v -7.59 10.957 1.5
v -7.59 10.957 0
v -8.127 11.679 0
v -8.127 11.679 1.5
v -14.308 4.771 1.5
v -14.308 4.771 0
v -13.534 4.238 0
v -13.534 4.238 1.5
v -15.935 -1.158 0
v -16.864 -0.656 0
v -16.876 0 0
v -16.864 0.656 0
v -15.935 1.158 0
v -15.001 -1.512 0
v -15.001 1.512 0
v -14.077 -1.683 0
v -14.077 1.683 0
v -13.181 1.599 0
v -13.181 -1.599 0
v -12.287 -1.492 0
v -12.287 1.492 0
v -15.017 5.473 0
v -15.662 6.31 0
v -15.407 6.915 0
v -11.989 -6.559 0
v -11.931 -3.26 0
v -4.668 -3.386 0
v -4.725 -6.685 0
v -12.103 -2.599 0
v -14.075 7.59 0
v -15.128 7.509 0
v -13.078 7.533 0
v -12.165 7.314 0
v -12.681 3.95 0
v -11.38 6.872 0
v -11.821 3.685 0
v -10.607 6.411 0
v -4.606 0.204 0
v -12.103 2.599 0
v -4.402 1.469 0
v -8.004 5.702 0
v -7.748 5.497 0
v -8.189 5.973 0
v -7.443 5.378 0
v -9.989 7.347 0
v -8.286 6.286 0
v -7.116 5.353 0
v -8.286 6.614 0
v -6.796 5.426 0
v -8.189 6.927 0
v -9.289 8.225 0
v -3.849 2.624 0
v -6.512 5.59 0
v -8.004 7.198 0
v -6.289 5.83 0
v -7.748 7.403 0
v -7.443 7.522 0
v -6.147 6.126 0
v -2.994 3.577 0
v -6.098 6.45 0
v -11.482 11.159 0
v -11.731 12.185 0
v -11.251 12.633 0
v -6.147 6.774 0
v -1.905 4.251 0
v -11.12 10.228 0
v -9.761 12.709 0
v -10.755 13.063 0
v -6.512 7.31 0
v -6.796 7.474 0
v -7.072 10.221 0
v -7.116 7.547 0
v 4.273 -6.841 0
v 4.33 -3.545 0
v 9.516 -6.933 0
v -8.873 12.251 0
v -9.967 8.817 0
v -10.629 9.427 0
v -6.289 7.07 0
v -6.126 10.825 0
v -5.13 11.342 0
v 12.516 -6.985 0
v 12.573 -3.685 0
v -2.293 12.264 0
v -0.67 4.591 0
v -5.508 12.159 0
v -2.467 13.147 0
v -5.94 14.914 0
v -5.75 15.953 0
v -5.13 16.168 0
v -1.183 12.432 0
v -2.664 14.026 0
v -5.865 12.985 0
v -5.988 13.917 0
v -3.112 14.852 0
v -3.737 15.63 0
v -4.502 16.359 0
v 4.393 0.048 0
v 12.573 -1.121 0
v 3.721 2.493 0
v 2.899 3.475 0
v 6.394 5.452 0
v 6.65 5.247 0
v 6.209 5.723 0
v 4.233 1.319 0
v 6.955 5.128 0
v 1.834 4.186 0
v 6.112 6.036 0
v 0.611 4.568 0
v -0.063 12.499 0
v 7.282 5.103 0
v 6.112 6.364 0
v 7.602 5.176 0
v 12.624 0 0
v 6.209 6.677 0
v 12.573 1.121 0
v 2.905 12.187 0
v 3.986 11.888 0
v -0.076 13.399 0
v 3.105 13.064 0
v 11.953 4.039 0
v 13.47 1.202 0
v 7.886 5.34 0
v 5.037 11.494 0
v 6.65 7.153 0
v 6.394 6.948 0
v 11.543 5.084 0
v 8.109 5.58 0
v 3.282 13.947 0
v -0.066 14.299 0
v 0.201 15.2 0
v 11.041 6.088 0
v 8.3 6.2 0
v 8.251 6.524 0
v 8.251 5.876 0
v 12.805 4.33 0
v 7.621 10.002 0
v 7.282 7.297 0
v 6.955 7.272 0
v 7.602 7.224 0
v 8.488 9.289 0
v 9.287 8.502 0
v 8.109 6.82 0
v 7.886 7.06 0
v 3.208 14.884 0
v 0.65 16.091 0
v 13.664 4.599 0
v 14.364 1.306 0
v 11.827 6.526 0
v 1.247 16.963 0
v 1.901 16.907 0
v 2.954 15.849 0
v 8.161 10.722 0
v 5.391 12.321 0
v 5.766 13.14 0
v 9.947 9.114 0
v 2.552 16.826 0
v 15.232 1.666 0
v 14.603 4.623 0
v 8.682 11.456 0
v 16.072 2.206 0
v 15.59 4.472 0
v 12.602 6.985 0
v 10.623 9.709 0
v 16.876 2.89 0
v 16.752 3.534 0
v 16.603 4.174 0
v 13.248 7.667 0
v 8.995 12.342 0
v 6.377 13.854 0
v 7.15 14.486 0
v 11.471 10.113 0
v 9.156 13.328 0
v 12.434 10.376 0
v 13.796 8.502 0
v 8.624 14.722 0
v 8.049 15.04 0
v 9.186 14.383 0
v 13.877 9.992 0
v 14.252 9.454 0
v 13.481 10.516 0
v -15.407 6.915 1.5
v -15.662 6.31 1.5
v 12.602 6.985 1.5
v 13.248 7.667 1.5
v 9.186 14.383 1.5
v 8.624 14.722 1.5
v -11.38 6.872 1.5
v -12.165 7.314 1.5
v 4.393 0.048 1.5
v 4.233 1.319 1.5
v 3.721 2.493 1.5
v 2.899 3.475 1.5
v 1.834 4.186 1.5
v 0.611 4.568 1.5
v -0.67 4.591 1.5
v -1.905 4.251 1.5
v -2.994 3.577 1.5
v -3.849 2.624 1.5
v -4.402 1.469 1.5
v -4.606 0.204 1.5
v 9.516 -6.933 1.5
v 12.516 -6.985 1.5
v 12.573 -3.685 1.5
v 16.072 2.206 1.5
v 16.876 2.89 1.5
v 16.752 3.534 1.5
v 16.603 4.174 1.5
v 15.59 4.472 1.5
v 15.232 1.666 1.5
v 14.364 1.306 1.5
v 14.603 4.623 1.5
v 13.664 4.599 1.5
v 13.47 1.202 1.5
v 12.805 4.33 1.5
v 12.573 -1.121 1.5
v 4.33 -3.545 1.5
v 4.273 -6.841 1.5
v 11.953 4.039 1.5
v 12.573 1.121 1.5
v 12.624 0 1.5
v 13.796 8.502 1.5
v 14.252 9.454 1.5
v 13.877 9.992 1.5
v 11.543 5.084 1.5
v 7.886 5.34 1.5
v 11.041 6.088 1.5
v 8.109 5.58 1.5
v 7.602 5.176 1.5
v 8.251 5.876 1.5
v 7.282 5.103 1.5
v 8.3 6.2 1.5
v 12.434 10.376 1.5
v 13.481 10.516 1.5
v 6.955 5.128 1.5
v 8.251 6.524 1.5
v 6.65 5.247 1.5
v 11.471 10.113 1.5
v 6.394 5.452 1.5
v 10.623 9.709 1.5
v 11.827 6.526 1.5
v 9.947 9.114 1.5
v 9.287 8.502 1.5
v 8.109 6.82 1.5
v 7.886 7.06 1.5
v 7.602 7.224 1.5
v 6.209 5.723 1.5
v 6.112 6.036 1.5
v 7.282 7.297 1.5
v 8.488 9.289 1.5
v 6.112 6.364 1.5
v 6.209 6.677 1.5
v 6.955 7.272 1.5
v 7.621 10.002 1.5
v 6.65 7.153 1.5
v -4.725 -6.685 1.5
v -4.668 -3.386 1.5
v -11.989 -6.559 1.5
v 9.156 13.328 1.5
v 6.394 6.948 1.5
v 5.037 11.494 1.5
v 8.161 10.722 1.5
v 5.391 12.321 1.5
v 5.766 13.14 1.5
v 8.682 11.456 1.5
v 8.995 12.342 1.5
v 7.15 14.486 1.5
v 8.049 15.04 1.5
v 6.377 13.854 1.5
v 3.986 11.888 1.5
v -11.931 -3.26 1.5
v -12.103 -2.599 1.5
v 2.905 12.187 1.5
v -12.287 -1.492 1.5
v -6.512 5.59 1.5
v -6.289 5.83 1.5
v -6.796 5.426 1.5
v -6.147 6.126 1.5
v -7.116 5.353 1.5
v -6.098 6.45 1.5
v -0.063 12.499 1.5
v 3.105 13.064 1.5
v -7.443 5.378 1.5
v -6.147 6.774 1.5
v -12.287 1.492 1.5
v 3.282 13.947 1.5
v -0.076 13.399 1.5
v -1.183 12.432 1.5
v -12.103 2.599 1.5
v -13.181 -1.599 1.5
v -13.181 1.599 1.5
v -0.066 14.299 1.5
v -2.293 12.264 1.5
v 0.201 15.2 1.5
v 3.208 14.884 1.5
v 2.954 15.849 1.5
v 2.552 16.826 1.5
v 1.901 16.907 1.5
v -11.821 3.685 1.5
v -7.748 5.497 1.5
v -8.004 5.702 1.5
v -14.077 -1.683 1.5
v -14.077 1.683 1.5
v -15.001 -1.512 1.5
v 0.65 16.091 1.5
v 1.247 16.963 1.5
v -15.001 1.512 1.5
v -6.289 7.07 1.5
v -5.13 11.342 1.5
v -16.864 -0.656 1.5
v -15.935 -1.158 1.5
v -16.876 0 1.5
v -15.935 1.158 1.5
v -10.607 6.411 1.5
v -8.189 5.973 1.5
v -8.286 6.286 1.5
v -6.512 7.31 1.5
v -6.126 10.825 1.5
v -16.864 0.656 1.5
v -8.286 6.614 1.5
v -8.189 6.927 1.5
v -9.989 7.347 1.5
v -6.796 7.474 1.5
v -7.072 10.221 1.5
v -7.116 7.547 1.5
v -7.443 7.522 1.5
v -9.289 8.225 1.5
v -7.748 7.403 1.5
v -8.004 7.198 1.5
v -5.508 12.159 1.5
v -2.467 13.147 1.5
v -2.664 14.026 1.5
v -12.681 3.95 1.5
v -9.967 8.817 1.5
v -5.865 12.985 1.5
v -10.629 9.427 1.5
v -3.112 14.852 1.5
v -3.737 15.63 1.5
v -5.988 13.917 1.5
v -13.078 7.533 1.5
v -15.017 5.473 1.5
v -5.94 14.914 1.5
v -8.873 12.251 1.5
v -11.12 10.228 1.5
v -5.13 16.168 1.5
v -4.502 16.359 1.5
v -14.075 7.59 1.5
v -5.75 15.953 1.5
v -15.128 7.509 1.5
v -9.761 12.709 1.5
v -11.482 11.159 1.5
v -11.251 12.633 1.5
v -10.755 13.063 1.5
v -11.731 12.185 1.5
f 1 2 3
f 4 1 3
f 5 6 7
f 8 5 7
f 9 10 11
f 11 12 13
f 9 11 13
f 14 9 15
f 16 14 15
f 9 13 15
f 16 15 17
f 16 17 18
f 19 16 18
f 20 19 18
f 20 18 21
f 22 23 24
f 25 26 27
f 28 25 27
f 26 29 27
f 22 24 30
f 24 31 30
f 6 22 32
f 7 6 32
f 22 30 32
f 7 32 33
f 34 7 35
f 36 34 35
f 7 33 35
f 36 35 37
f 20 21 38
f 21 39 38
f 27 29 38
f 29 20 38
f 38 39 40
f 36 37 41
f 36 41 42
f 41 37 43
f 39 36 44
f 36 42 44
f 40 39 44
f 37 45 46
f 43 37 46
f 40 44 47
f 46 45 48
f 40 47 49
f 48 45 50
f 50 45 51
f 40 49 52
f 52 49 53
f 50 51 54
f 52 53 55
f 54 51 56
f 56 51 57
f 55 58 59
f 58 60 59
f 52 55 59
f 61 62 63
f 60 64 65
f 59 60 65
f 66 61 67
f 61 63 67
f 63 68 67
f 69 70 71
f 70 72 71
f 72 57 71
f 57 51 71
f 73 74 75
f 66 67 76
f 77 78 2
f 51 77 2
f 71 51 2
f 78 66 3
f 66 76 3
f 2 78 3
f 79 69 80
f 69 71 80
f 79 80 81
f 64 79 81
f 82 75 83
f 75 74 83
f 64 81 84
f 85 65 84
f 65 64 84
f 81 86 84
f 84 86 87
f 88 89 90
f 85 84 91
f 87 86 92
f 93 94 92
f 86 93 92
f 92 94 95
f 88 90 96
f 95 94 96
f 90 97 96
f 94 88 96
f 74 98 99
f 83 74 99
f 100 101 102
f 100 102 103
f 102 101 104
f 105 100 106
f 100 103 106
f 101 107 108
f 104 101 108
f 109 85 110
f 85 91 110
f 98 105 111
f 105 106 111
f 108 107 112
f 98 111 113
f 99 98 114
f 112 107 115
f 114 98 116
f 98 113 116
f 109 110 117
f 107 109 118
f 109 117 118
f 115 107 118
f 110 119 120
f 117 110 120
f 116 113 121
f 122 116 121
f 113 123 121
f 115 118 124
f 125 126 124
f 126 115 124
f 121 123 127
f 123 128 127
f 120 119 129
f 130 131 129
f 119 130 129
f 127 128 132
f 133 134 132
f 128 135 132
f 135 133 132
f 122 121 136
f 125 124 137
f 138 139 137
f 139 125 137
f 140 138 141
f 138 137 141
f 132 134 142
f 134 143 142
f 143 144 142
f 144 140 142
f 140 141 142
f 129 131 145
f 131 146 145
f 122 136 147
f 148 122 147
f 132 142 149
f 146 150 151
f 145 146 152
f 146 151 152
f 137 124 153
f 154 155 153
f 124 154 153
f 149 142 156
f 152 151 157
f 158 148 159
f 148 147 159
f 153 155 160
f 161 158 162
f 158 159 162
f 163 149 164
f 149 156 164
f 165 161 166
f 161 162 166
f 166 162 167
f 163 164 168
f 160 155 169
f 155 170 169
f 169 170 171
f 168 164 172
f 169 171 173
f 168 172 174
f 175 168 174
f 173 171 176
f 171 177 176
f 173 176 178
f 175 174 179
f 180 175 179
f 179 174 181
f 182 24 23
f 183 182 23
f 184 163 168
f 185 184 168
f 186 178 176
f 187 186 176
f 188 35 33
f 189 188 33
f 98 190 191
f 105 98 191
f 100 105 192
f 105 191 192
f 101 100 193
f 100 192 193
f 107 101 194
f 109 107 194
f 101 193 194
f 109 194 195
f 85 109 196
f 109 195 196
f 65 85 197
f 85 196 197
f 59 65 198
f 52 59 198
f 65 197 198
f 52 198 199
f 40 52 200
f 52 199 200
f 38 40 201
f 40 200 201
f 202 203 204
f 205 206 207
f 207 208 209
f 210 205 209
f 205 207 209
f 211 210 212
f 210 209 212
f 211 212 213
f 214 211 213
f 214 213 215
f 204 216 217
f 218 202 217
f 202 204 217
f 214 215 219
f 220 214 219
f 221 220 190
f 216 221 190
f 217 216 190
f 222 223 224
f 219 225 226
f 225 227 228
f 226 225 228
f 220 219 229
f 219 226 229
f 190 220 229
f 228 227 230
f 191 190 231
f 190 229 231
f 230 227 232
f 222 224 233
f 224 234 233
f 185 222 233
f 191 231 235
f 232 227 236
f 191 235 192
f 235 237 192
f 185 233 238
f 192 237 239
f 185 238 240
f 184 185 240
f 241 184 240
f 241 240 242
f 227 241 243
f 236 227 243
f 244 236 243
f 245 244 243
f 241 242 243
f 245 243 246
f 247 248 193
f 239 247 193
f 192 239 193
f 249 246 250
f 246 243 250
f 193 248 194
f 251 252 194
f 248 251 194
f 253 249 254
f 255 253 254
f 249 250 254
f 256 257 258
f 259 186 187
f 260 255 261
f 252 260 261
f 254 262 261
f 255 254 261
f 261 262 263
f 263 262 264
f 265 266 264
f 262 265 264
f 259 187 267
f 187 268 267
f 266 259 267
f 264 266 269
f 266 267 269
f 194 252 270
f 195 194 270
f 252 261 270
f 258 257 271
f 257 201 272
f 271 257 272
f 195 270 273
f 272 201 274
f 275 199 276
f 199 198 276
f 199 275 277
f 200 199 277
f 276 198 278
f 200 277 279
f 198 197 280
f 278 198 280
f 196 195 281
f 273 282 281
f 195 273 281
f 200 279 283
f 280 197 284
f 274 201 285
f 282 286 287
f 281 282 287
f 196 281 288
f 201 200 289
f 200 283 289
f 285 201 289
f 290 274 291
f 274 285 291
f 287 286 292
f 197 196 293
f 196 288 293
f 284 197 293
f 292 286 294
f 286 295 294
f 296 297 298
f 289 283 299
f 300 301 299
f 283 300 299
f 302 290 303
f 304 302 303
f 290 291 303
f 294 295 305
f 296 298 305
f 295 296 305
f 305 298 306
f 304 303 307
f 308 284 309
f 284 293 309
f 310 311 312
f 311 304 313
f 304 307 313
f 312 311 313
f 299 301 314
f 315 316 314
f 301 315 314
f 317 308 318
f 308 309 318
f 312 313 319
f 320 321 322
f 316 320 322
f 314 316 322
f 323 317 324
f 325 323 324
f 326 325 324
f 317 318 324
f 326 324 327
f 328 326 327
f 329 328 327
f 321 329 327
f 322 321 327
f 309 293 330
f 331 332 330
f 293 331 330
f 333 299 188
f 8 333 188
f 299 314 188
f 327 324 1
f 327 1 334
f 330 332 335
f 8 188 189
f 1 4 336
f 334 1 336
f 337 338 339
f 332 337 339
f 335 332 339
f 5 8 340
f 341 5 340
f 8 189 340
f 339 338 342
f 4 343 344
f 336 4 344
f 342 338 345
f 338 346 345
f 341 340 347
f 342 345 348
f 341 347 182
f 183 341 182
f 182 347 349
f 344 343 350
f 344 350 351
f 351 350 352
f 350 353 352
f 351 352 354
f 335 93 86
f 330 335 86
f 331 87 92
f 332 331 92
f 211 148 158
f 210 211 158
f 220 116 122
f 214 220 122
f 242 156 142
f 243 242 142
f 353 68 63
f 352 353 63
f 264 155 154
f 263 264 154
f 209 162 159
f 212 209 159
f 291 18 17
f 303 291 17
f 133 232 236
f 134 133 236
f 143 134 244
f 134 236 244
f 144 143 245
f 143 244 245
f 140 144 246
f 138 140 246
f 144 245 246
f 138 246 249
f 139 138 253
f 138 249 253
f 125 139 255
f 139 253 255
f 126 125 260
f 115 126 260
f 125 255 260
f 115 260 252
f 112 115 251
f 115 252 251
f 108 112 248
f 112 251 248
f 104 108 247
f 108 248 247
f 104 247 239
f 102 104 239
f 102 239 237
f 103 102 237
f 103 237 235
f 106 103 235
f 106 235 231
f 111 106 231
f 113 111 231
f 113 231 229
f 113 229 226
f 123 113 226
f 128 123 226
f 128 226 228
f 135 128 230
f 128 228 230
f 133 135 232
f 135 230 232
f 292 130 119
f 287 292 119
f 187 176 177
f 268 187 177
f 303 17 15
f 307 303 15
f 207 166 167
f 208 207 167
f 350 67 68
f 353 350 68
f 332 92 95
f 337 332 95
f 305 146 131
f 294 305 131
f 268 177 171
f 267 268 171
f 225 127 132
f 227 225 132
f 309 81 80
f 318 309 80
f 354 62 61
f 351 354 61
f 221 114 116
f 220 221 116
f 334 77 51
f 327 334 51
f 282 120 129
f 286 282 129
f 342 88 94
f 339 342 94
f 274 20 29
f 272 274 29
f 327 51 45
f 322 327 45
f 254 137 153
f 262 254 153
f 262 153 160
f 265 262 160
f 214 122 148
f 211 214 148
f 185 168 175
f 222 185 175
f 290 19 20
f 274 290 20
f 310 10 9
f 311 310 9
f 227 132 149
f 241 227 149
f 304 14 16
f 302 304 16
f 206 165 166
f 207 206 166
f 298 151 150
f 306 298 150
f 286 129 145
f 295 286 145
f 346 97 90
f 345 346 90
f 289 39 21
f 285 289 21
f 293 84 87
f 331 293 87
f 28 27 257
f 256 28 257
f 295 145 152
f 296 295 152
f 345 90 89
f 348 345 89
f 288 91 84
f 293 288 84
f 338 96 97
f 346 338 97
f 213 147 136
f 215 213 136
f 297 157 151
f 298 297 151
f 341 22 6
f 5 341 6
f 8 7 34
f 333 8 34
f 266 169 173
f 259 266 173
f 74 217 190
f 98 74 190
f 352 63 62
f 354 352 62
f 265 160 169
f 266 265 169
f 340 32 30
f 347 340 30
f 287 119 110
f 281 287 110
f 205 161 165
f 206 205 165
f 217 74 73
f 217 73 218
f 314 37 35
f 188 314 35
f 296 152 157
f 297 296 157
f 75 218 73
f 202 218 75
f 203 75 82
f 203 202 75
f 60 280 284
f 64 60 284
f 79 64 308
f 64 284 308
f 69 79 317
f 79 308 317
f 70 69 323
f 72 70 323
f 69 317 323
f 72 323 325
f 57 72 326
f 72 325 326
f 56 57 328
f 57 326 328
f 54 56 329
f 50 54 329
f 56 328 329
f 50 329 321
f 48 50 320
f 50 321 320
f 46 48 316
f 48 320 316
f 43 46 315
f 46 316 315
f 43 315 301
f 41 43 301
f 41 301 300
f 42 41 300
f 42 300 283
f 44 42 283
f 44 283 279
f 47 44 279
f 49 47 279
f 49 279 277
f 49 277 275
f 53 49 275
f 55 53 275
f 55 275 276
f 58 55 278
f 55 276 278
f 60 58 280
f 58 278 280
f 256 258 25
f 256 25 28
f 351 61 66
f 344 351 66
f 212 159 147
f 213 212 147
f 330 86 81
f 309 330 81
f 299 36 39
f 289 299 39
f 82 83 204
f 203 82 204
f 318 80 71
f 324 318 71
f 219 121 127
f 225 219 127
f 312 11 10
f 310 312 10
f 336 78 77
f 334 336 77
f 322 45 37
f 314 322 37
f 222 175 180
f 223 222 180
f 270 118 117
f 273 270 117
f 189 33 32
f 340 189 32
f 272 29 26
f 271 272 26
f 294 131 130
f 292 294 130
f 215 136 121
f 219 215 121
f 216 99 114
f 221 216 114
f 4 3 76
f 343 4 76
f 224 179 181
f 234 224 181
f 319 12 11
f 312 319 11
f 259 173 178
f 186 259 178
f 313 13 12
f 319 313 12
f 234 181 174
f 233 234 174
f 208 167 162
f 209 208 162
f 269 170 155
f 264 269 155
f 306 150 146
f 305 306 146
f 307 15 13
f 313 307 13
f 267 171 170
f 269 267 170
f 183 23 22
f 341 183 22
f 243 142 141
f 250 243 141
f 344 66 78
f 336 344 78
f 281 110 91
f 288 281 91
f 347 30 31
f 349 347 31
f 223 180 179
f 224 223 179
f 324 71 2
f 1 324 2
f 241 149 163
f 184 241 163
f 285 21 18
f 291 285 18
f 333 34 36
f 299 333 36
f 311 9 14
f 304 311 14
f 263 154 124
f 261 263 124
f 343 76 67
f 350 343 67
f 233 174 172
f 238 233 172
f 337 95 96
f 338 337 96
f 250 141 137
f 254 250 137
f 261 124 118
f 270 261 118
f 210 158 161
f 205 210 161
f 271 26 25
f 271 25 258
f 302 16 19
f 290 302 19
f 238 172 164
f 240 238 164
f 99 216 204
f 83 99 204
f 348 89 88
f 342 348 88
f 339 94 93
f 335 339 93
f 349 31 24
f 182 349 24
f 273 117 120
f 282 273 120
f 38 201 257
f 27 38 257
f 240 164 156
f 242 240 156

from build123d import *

# Parameters (mm, degrees)
F1_DEPTH  = 1.5
F2_R      = 1.1
F3_DEPTH  = 1.5
F4_W      = 4.2642379355
F4_H      = 1.5
F4_W_2    = 3
F4_W_3    = 5.2441455437
F3_FACE_W = 8.0745559603
F3_FACE_H = 1.5
F5_DEPTH  = 3.3


with BuildPart() as f1:
    # F0 (on Top) → F1 (new body)
    with BuildSketch(Plane.XY):
        Polygon((12.573339, -1.121183), (12.623723, 0), (12.573339, 1.121183), (13.469712, 1.201909), (14.363964, 1.305965), (15.232179, 1.665703), (16.071924, 2.205645), (16.876276, 2.889975), (16.752232, 3.534499), (16.603401, 4.173754), (15.590247, 4.47176), (14.603487, 4.623467), (13.664014, 4.59897), (12.804751, 4.330305), (11.95304, 4.039463), (11.543041, 5.084208), (11.040987, 6.087967), (11.82703, 6.526301), (12.601647, 6.985086), (13.248481, 7.666858), (13.796013, 8.501675), (14.252483, 9.454001), (13.877012, 9.992349), (13.481039, 10.515803), (12.434267, 10.375958), (11.471112, 10.113197), (10.622825, 9.7087), (9.947125, 9.113769), (9.287344, 8.50165), (8.487856, 9.28931), (7.620941, 10.002086), (8.16074, 10.722236), (8.681783, 11.456422), (8.995394, 12.342344), (9.156039, 13.327688), (9.185699, 14.383344), (8.623723, 14.722432), (8.049076, 15.039574), (7.149682, 14.486059), (6.376671, 13.854265), (5.766246, 13.139708), (5.390943, 12.321379), (5.037175, 11.493824), (3.986435, 11.888206), (2.904557, 12.186753), (3.104777, 13.0642), (3.282153, 13.946839), (3.208314, 14.883726), (2.954295, 15.849223), (2.552017, 16.825676), (1.900707, 16.906872), (1.246748, 16.962866), (0.650245, 16.091388), (0.201038, 15.199803), (-0.065977, 14.298742), (-0.075988, 13.398512), (-0.062575, 12.498612), (-1.182883, 12.431524), (-2.292658, 12.264221), (-2.466637, 13.147244), (-2.663598, 14.025721), (-3.112119, 14.851577), (-3.736881, 15.630283), (-4.501539, 16.358696), (-5.129566, 16.167961), (-5.749762, 15.953124), (-5.940233, 14.91437), (-5.987963, 13.917158), (-5.865399, 12.985393), (-5.508388, 12.15892), (-5.130112, 11.342276), (-6.126277, 10.825318), (-7.072058, 10.221092), (-7.590155, 10.957011), (-8.127396, 11.679428), (-8.873046, 12.251455), (-9.760523, 12.708725), (-10.755346, 13.063149), (-11.251497, 12.633462), (-11.730693, 12.184943), (-11.482197, 11.158522), (-11.120198, 10.22811), (-10.629247, 9.426751), (-9.966945, 8.81694), (-9.289213, 8.224757), (-9.988989, 7.347316), (-10.607243, 6.410645), (-11.379873, 6.872211), (-12.164501, 7.313656), (-13.07835, 7.532945), (-14.075089, 7.589713), (-15.128062, 7.508865), (-15.40655, 6.914523), (-15.661887, 6.309874), (-15.017392, 5.473264), (-14.308257, 4.770528), (-13.533809, 4.238139), (-12.680733, 3.950431), (-11.820732, 3.685104), (-12.103122, 2.598896), (-12.286947, 1.491738), (-13.180515, 1.599143), (-14.07686, 1.683286), (-15.000896, 1.511921), (-15.934551, 1.158371), (-16.863606, 0.656229), (-16.876277, 0), (-16.863606, -0.656229), (-15.934551, -1.158371), (-15.000896, -1.511921), (-14.07686, -1.683286), (-13.180515, -1.599143), (-12.286947, -1.491738), (-12.103122, -2.598896), (-11.820732, -3.685104), (-12.680733, -3.950431), (-13.533809, -4.238139), (-14.308257, -4.770528), (-15.017392, -5.473264), (-15.661887, -6.309874), (-15.40655, -6.914523), (-15.128062, -7.508865), (-14.075089, -7.589713), (-13.07835, -7.532945), (-12.164501, -7.313656), (-11.379873, -6.872211), (-10.607243, -6.410645), (-9.988989, -7.347316), (-9.289213, -8.224757), (-9.966945, -8.81694), (-10.629247, -9.426751), (-11.120198, -10.22811), (-11.482197, -11.158522), (-11.730693, -12.184943), (-11.251497, -12.633462), (-10.755346, -13.063149), (-9.760523, -12.708725), (-8.873046, -12.251455), (-8.127396, -11.679428), (-7.590155, -10.957011), (-7.072058, -10.221092), (-6.126277, -10.825318), (-5.130112, -11.342276), (-5.508388, -12.15892), (-5.865399, -12.985393), (-5.987963, -13.917158), (-5.940233, -14.91437), (-5.749762, -15.953124), (-5.129566, -16.167961), (-4.501539, -16.358696), (-3.736881, -15.630283), (-3.112119, -14.851577), (-2.663598, -14.025721), (-2.466637, -13.147244), (-2.292658, -12.264221), (-1.182883, -12.431524), (-0.062575, -12.498612), (-0.075988, -13.398512), (-0.065977, -14.298742), (0.201038, -15.199803), (0.650245, -16.091388), (1.246748, -16.962866), (1.900707, -16.906872), (2.552017, -16.825676), (2.954295, -15.849223), (3.208314, -14.883726), (3.282153, -13.946839), (3.104777, -13.0642), (2.904557, -12.186753), (3.986435, -11.888206), (5.037175, -11.493824), (5.390943, -12.321379), (5.766246, -13.139708), (6.376671, -13.854265), (7.149682, -14.486059), (8.049076, -15.039574), (8.623723, -14.722432), (9.185699, -14.383344), (9.156039, -13.327688), (8.995394, -12.342344), (8.681783, -11.456422), (8.16074, -10.722236), (7.620941, -10.002086), (8.487856, -9.28931), (9.287344, -8.50165), (9.947125, -9.113769), (10.622825, -9.7087), (11.471112, -10.113197), (12.434267, -10.375958), (13.481039, -10.515803), (13.877012, -9.992349), (14.252483, -9.454001), (13.796013, -8.501675), (13.248481, -7.666858), (12.601647, -6.985086), (11.82703, -6.526301), (11.040987, -6.087967), (11.543041, -5.084208), (11.95304, -4.039463), (12.804751, -4.330305), (13.664014, -4.59897), (14.603487, -4.623467), (15.590247, -4.47176), (16.603401, -4.173754), (16.752232, -3.534499), (16.876276, -2.889975), (16.071924, -2.205645), (15.232179, -1.665703), (14.363964, -1.305965), (13.469712, -1.201909), align=None)
    extrude(amount=F1_DEPTH)

    # F2 (on face) → F3 (cut, through all)
    with BuildSketch(Plane.XY.offset(1.5)):
        with Locations((-7.1978296976, 6.45)):
            Circle(F2_R)
        with Locations((7.2, 6.2)):
            Circle(F2_R)
        with BuildLine():
            Line((13.469712, -1.201909), (12.573339, -1.121183))
            Line((12.573339, -1.121183), (12.573339, -3.685104))
            Line((12.573339, -3.685104), (4.5, -3.5449207368))
            Line((4.5, -3.5449207368), (4.330384853, -3.5449207368))
            Line((4.330384853, -3.5449207368), (4.3927680428, 0.0478094358))
            ThreePointArc((4.3927680428, 0.0478094358), (-0.0284287377, 4.6252562163), (-4.6058755182, 0.2040594358))
            Line((-4.6058755182, 0.2040594358), (-4.6682075846, -3.3857264732))
            Line((-4.6682075846, -3.3857264732), (-11.9313506872, -3.2596112313))
            Line((-11.9313506872, -3.2596112313), (-11.820732, -3.685104))
            Line((-11.820732, -3.685104), (-12.680733, -3.950431))
            Line((-12.680733, -3.950431), (-13.533809, -4.238139))
            Line((-13.533809, -4.238139), (-14.308257, -4.770528))
            Line((-14.308257, -4.770528), (-15.017392, -5.473264))
            Line((-15.017392, -5.473264), (-15.661887, -6.309874))
            Line((-15.661887, -6.309874), (-15.40655, -6.914523))
            Line((-15.40655, -6.914523), (-15.128062, -7.508865))
            Line((-15.128062, -7.508865), (-14.075089, -7.589713))
            Line((-14.075089, -7.589713), (-13.07835, -7.532945))
            Line((-13.07835, -7.532945), (-12.164501, -7.313656))
            Line((-12.164501, -7.313656), (-11.379873, -6.872211))
            Line((-11.379873, -6.872211), (-10.607243, -6.410645))
            Line((-10.607243, -6.410645), (-9.988989, -7.347316))
            Line((-9.988989, -7.347316), (-9.289213, -8.224757))
            Line((-9.289213, -8.224757), (-9.966945, -8.81694))
            Line((-9.966945, -8.81694), (-10.629247, -9.426751))
            Line((-10.629247, -9.426751), (-11.120198, -10.22811))
            Line((-11.120198, -10.22811), (-11.482197, -11.158522))
            Line((-11.482197, -11.158522), (-11.730693, -12.184943))
            Line((-11.730693, -12.184943), (-11.251497, -12.633462))
            Line((-11.251497, -12.633462), (-10.755346, -13.063149))
            Line((-10.755346, -13.063149), (-9.760523, -12.708725))
            Line((-9.760523, -12.708725), (-8.873046, -12.251455))
            Line((-8.873046, -12.251455), (-8.127396, -11.679428))
            Line((-8.127396, -11.679428), (-7.590155, -10.957011))
            Line((-7.590155, -10.957011), (-7.072058, -10.221092))
            Line((-7.072058, -10.221092), (-6.126277, -10.825318))
            Line((-6.126277, -10.825318), (-5.130112, -11.342276))
            Line((-5.130112, -11.342276), (-5.508388, -12.15892))
            Line((-5.508388, -12.15892), (-5.865399, -12.985393))
            Line((-5.865399, -12.985393), (-5.987963, -13.917158))
            Line((-5.987963, -13.917158), (-5.940233, -14.91437))
            Line((-5.940233, -14.91437), (-5.749762, -15.953124))
            Line((-5.749762, -15.953124), (-5.129566, -16.167961))
            Line((-5.129566, -16.167961), (-4.501539, -16.358696))
            Line((-4.501539, -16.358696), (-3.736881, -15.630283))
            Line((-3.736881, -15.630283), (-3.112119, -14.851577))
            Line((-3.112119, -14.851577), (-2.663598, -14.025721))
            Line((-2.663598, -14.025721), (-2.466637, -13.147244))
            Line((-2.466637, -13.147244), (-2.292658, -12.264221))
            Line((-2.292658, -12.264221), (-1.182883, -12.431524))
            Line((-1.182883, -12.431524), (-0.062575, -12.498612))
            Line((-0.062575, -12.498612), (-0.075988, -13.398512))
            Line((-0.075988, -13.398512), (-0.065977, -14.298742))
            Line((-0.065977, -14.298742), (0.201038, -15.199803))
            Line((0.201038, -15.199803), (0.650245, -16.091388))
            Line((0.650245, -16.091388), (1.246748, -16.962866))
            Line((1.246748, -16.962866), (1.900707, -16.906872))
            Line((1.900707, -16.906872), (2.552017, -16.825676))
            Line((2.552017, -16.825676), (2.954295, -15.849223))
            Line((2.954295, -15.849223), (3.208314, -14.883726))
            Line((3.208314, -14.883726), (3.282153, -13.946839))
            Line((3.282153, -13.946839), (3.104777, -13.0642))
            Line((3.104777, -13.0642), (2.904557, -12.186753))
            Line((2.904557, -12.186753), (3.986435, -11.888206))
            Line((3.986435, -11.888206), (5.037175, -11.493824))
            Line((5.037175, -11.493824), (5.390943, -12.321379))
            Line((5.390943, -12.321379), (5.766246, -13.139708))
            Line((5.766246, -13.139708), (6.376671, -13.854265))
            Line((6.376671, -13.854265), (7.149682, -14.486059))
            Line((7.149682, -14.486059), (8.049076, -15.039574))
            Line((8.049076, -15.039574), (8.623723, -14.722432))
            Line((8.623723, -14.722432), (9.185699, -14.383344))
            Line((9.185699, -14.383344), (9.156039, -13.327688))
            Line((9.156039, -13.327688), (8.995394, -12.342344))
            Line((8.995394, -12.342344), (8.681783, -11.456422))
            Line((8.681783, -11.456422), (8.16074, -10.722236))
            Line((8.16074, -10.722236), (7.620941, -10.002086))
            Line((7.620941, -10.002086), (8.487856, -9.28931))
            Line((8.487856, -9.28931), (9.287344, -8.50165))
            Line((9.287344, -8.50165), (9.947125, -9.113769))
            Line((9.947125, -9.113769), (10.622825, -9.7087))
            Line((10.622825, -9.7087), (11.471112, -10.113197))
            Line((11.471112, -10.113197), (12.434267, -10.375958))
            Line((12.434267, -10.375958), (13.481039, -10.515803))
            Line((13.481039, -10.515803), (13.877012, -9.992349))
            Line((13.877012, -9.992349), (14.252483, -9.454001))
            Line((14.252483, -9.454001), (13.796013, -8.501675))
            Line((13.796013, -8.501675), (13.248481, -7.666858))
            Line((13.248481, -7.666858), (12.601647, -6.985086))
            Line((12.601647, -6.985086), (11.82703, -6.526301))
            Line((11.82703, -6.526301), (11.040987, -6.087967))
            Line((11.040987, -6.087967), (11.543041, -5.084208))
            Line((11.543041, -5.084208), (11.95304, -4.039463))
            Line((11.95304, -4.039463), (12.804751, -4.330305))
            Line((12.804751, -4.330305), (13.664014, -4.59897))
            Line((13.664014, -4.59897), (14.603487, -4.623467))
            Line((14.603487, -4.623467), (15.590247, -4.47176))
            Line((15.590247, -4.47176), (16.603401, -4.173754))
            Line((16.603401, -4.173754), (16.752232, -3.534499))
            Line((16.752232, -3.534499), (16.876276, -2.889975))
            Line((16.876276, -2.889975), (16.071924, -2.205645))
            Line((16.071924, -2.205645), (15.232179, -1.665703))
            Line((15.232179, -1.665703), (14.363964, -1.305965))
            Line((14.363964, -1.305965), (13.469712, -1.201909))
        make_face()
    extrude(amount=-F3_DEPTH, mode=Mode.SUBTRACT)

    # F4 (on face) + F3_face (on face) → F5 (join)
    with BuildSketch(Plane(origin=(-0.0601781504, -3.4657390433, 0), x_dir=(0.9998492846, -0.0173611111, 0), z_dir=(-0.0173611111, -0.9998492846, 0))):
        with Locations((-6.7408430078, 0.75)):
            Rectangle(F4_W, F4_H)
        with Locations((-10.3729619756, 0.75)):
            Rectangle(F4_W_2, F4_H)
        with Locations((7.0133487317, 0.75)):
            Rectangle(F4_W_3, F4_H)
    with BuildSketch(Plane(origin=(-8.2997791359, -3.3226688522, 0.75), x_dir=(0.9998492846, -0.0173611111, 0), z_dir=(-0.0173611111, -0.9998492846, 0))):
        with Locations((16.8389865313, 0)):
            Rectangle(F3_FACE_W, F3_FACE_H)
    extrude(amount=F5_DEPTH)


solid = f1.part
